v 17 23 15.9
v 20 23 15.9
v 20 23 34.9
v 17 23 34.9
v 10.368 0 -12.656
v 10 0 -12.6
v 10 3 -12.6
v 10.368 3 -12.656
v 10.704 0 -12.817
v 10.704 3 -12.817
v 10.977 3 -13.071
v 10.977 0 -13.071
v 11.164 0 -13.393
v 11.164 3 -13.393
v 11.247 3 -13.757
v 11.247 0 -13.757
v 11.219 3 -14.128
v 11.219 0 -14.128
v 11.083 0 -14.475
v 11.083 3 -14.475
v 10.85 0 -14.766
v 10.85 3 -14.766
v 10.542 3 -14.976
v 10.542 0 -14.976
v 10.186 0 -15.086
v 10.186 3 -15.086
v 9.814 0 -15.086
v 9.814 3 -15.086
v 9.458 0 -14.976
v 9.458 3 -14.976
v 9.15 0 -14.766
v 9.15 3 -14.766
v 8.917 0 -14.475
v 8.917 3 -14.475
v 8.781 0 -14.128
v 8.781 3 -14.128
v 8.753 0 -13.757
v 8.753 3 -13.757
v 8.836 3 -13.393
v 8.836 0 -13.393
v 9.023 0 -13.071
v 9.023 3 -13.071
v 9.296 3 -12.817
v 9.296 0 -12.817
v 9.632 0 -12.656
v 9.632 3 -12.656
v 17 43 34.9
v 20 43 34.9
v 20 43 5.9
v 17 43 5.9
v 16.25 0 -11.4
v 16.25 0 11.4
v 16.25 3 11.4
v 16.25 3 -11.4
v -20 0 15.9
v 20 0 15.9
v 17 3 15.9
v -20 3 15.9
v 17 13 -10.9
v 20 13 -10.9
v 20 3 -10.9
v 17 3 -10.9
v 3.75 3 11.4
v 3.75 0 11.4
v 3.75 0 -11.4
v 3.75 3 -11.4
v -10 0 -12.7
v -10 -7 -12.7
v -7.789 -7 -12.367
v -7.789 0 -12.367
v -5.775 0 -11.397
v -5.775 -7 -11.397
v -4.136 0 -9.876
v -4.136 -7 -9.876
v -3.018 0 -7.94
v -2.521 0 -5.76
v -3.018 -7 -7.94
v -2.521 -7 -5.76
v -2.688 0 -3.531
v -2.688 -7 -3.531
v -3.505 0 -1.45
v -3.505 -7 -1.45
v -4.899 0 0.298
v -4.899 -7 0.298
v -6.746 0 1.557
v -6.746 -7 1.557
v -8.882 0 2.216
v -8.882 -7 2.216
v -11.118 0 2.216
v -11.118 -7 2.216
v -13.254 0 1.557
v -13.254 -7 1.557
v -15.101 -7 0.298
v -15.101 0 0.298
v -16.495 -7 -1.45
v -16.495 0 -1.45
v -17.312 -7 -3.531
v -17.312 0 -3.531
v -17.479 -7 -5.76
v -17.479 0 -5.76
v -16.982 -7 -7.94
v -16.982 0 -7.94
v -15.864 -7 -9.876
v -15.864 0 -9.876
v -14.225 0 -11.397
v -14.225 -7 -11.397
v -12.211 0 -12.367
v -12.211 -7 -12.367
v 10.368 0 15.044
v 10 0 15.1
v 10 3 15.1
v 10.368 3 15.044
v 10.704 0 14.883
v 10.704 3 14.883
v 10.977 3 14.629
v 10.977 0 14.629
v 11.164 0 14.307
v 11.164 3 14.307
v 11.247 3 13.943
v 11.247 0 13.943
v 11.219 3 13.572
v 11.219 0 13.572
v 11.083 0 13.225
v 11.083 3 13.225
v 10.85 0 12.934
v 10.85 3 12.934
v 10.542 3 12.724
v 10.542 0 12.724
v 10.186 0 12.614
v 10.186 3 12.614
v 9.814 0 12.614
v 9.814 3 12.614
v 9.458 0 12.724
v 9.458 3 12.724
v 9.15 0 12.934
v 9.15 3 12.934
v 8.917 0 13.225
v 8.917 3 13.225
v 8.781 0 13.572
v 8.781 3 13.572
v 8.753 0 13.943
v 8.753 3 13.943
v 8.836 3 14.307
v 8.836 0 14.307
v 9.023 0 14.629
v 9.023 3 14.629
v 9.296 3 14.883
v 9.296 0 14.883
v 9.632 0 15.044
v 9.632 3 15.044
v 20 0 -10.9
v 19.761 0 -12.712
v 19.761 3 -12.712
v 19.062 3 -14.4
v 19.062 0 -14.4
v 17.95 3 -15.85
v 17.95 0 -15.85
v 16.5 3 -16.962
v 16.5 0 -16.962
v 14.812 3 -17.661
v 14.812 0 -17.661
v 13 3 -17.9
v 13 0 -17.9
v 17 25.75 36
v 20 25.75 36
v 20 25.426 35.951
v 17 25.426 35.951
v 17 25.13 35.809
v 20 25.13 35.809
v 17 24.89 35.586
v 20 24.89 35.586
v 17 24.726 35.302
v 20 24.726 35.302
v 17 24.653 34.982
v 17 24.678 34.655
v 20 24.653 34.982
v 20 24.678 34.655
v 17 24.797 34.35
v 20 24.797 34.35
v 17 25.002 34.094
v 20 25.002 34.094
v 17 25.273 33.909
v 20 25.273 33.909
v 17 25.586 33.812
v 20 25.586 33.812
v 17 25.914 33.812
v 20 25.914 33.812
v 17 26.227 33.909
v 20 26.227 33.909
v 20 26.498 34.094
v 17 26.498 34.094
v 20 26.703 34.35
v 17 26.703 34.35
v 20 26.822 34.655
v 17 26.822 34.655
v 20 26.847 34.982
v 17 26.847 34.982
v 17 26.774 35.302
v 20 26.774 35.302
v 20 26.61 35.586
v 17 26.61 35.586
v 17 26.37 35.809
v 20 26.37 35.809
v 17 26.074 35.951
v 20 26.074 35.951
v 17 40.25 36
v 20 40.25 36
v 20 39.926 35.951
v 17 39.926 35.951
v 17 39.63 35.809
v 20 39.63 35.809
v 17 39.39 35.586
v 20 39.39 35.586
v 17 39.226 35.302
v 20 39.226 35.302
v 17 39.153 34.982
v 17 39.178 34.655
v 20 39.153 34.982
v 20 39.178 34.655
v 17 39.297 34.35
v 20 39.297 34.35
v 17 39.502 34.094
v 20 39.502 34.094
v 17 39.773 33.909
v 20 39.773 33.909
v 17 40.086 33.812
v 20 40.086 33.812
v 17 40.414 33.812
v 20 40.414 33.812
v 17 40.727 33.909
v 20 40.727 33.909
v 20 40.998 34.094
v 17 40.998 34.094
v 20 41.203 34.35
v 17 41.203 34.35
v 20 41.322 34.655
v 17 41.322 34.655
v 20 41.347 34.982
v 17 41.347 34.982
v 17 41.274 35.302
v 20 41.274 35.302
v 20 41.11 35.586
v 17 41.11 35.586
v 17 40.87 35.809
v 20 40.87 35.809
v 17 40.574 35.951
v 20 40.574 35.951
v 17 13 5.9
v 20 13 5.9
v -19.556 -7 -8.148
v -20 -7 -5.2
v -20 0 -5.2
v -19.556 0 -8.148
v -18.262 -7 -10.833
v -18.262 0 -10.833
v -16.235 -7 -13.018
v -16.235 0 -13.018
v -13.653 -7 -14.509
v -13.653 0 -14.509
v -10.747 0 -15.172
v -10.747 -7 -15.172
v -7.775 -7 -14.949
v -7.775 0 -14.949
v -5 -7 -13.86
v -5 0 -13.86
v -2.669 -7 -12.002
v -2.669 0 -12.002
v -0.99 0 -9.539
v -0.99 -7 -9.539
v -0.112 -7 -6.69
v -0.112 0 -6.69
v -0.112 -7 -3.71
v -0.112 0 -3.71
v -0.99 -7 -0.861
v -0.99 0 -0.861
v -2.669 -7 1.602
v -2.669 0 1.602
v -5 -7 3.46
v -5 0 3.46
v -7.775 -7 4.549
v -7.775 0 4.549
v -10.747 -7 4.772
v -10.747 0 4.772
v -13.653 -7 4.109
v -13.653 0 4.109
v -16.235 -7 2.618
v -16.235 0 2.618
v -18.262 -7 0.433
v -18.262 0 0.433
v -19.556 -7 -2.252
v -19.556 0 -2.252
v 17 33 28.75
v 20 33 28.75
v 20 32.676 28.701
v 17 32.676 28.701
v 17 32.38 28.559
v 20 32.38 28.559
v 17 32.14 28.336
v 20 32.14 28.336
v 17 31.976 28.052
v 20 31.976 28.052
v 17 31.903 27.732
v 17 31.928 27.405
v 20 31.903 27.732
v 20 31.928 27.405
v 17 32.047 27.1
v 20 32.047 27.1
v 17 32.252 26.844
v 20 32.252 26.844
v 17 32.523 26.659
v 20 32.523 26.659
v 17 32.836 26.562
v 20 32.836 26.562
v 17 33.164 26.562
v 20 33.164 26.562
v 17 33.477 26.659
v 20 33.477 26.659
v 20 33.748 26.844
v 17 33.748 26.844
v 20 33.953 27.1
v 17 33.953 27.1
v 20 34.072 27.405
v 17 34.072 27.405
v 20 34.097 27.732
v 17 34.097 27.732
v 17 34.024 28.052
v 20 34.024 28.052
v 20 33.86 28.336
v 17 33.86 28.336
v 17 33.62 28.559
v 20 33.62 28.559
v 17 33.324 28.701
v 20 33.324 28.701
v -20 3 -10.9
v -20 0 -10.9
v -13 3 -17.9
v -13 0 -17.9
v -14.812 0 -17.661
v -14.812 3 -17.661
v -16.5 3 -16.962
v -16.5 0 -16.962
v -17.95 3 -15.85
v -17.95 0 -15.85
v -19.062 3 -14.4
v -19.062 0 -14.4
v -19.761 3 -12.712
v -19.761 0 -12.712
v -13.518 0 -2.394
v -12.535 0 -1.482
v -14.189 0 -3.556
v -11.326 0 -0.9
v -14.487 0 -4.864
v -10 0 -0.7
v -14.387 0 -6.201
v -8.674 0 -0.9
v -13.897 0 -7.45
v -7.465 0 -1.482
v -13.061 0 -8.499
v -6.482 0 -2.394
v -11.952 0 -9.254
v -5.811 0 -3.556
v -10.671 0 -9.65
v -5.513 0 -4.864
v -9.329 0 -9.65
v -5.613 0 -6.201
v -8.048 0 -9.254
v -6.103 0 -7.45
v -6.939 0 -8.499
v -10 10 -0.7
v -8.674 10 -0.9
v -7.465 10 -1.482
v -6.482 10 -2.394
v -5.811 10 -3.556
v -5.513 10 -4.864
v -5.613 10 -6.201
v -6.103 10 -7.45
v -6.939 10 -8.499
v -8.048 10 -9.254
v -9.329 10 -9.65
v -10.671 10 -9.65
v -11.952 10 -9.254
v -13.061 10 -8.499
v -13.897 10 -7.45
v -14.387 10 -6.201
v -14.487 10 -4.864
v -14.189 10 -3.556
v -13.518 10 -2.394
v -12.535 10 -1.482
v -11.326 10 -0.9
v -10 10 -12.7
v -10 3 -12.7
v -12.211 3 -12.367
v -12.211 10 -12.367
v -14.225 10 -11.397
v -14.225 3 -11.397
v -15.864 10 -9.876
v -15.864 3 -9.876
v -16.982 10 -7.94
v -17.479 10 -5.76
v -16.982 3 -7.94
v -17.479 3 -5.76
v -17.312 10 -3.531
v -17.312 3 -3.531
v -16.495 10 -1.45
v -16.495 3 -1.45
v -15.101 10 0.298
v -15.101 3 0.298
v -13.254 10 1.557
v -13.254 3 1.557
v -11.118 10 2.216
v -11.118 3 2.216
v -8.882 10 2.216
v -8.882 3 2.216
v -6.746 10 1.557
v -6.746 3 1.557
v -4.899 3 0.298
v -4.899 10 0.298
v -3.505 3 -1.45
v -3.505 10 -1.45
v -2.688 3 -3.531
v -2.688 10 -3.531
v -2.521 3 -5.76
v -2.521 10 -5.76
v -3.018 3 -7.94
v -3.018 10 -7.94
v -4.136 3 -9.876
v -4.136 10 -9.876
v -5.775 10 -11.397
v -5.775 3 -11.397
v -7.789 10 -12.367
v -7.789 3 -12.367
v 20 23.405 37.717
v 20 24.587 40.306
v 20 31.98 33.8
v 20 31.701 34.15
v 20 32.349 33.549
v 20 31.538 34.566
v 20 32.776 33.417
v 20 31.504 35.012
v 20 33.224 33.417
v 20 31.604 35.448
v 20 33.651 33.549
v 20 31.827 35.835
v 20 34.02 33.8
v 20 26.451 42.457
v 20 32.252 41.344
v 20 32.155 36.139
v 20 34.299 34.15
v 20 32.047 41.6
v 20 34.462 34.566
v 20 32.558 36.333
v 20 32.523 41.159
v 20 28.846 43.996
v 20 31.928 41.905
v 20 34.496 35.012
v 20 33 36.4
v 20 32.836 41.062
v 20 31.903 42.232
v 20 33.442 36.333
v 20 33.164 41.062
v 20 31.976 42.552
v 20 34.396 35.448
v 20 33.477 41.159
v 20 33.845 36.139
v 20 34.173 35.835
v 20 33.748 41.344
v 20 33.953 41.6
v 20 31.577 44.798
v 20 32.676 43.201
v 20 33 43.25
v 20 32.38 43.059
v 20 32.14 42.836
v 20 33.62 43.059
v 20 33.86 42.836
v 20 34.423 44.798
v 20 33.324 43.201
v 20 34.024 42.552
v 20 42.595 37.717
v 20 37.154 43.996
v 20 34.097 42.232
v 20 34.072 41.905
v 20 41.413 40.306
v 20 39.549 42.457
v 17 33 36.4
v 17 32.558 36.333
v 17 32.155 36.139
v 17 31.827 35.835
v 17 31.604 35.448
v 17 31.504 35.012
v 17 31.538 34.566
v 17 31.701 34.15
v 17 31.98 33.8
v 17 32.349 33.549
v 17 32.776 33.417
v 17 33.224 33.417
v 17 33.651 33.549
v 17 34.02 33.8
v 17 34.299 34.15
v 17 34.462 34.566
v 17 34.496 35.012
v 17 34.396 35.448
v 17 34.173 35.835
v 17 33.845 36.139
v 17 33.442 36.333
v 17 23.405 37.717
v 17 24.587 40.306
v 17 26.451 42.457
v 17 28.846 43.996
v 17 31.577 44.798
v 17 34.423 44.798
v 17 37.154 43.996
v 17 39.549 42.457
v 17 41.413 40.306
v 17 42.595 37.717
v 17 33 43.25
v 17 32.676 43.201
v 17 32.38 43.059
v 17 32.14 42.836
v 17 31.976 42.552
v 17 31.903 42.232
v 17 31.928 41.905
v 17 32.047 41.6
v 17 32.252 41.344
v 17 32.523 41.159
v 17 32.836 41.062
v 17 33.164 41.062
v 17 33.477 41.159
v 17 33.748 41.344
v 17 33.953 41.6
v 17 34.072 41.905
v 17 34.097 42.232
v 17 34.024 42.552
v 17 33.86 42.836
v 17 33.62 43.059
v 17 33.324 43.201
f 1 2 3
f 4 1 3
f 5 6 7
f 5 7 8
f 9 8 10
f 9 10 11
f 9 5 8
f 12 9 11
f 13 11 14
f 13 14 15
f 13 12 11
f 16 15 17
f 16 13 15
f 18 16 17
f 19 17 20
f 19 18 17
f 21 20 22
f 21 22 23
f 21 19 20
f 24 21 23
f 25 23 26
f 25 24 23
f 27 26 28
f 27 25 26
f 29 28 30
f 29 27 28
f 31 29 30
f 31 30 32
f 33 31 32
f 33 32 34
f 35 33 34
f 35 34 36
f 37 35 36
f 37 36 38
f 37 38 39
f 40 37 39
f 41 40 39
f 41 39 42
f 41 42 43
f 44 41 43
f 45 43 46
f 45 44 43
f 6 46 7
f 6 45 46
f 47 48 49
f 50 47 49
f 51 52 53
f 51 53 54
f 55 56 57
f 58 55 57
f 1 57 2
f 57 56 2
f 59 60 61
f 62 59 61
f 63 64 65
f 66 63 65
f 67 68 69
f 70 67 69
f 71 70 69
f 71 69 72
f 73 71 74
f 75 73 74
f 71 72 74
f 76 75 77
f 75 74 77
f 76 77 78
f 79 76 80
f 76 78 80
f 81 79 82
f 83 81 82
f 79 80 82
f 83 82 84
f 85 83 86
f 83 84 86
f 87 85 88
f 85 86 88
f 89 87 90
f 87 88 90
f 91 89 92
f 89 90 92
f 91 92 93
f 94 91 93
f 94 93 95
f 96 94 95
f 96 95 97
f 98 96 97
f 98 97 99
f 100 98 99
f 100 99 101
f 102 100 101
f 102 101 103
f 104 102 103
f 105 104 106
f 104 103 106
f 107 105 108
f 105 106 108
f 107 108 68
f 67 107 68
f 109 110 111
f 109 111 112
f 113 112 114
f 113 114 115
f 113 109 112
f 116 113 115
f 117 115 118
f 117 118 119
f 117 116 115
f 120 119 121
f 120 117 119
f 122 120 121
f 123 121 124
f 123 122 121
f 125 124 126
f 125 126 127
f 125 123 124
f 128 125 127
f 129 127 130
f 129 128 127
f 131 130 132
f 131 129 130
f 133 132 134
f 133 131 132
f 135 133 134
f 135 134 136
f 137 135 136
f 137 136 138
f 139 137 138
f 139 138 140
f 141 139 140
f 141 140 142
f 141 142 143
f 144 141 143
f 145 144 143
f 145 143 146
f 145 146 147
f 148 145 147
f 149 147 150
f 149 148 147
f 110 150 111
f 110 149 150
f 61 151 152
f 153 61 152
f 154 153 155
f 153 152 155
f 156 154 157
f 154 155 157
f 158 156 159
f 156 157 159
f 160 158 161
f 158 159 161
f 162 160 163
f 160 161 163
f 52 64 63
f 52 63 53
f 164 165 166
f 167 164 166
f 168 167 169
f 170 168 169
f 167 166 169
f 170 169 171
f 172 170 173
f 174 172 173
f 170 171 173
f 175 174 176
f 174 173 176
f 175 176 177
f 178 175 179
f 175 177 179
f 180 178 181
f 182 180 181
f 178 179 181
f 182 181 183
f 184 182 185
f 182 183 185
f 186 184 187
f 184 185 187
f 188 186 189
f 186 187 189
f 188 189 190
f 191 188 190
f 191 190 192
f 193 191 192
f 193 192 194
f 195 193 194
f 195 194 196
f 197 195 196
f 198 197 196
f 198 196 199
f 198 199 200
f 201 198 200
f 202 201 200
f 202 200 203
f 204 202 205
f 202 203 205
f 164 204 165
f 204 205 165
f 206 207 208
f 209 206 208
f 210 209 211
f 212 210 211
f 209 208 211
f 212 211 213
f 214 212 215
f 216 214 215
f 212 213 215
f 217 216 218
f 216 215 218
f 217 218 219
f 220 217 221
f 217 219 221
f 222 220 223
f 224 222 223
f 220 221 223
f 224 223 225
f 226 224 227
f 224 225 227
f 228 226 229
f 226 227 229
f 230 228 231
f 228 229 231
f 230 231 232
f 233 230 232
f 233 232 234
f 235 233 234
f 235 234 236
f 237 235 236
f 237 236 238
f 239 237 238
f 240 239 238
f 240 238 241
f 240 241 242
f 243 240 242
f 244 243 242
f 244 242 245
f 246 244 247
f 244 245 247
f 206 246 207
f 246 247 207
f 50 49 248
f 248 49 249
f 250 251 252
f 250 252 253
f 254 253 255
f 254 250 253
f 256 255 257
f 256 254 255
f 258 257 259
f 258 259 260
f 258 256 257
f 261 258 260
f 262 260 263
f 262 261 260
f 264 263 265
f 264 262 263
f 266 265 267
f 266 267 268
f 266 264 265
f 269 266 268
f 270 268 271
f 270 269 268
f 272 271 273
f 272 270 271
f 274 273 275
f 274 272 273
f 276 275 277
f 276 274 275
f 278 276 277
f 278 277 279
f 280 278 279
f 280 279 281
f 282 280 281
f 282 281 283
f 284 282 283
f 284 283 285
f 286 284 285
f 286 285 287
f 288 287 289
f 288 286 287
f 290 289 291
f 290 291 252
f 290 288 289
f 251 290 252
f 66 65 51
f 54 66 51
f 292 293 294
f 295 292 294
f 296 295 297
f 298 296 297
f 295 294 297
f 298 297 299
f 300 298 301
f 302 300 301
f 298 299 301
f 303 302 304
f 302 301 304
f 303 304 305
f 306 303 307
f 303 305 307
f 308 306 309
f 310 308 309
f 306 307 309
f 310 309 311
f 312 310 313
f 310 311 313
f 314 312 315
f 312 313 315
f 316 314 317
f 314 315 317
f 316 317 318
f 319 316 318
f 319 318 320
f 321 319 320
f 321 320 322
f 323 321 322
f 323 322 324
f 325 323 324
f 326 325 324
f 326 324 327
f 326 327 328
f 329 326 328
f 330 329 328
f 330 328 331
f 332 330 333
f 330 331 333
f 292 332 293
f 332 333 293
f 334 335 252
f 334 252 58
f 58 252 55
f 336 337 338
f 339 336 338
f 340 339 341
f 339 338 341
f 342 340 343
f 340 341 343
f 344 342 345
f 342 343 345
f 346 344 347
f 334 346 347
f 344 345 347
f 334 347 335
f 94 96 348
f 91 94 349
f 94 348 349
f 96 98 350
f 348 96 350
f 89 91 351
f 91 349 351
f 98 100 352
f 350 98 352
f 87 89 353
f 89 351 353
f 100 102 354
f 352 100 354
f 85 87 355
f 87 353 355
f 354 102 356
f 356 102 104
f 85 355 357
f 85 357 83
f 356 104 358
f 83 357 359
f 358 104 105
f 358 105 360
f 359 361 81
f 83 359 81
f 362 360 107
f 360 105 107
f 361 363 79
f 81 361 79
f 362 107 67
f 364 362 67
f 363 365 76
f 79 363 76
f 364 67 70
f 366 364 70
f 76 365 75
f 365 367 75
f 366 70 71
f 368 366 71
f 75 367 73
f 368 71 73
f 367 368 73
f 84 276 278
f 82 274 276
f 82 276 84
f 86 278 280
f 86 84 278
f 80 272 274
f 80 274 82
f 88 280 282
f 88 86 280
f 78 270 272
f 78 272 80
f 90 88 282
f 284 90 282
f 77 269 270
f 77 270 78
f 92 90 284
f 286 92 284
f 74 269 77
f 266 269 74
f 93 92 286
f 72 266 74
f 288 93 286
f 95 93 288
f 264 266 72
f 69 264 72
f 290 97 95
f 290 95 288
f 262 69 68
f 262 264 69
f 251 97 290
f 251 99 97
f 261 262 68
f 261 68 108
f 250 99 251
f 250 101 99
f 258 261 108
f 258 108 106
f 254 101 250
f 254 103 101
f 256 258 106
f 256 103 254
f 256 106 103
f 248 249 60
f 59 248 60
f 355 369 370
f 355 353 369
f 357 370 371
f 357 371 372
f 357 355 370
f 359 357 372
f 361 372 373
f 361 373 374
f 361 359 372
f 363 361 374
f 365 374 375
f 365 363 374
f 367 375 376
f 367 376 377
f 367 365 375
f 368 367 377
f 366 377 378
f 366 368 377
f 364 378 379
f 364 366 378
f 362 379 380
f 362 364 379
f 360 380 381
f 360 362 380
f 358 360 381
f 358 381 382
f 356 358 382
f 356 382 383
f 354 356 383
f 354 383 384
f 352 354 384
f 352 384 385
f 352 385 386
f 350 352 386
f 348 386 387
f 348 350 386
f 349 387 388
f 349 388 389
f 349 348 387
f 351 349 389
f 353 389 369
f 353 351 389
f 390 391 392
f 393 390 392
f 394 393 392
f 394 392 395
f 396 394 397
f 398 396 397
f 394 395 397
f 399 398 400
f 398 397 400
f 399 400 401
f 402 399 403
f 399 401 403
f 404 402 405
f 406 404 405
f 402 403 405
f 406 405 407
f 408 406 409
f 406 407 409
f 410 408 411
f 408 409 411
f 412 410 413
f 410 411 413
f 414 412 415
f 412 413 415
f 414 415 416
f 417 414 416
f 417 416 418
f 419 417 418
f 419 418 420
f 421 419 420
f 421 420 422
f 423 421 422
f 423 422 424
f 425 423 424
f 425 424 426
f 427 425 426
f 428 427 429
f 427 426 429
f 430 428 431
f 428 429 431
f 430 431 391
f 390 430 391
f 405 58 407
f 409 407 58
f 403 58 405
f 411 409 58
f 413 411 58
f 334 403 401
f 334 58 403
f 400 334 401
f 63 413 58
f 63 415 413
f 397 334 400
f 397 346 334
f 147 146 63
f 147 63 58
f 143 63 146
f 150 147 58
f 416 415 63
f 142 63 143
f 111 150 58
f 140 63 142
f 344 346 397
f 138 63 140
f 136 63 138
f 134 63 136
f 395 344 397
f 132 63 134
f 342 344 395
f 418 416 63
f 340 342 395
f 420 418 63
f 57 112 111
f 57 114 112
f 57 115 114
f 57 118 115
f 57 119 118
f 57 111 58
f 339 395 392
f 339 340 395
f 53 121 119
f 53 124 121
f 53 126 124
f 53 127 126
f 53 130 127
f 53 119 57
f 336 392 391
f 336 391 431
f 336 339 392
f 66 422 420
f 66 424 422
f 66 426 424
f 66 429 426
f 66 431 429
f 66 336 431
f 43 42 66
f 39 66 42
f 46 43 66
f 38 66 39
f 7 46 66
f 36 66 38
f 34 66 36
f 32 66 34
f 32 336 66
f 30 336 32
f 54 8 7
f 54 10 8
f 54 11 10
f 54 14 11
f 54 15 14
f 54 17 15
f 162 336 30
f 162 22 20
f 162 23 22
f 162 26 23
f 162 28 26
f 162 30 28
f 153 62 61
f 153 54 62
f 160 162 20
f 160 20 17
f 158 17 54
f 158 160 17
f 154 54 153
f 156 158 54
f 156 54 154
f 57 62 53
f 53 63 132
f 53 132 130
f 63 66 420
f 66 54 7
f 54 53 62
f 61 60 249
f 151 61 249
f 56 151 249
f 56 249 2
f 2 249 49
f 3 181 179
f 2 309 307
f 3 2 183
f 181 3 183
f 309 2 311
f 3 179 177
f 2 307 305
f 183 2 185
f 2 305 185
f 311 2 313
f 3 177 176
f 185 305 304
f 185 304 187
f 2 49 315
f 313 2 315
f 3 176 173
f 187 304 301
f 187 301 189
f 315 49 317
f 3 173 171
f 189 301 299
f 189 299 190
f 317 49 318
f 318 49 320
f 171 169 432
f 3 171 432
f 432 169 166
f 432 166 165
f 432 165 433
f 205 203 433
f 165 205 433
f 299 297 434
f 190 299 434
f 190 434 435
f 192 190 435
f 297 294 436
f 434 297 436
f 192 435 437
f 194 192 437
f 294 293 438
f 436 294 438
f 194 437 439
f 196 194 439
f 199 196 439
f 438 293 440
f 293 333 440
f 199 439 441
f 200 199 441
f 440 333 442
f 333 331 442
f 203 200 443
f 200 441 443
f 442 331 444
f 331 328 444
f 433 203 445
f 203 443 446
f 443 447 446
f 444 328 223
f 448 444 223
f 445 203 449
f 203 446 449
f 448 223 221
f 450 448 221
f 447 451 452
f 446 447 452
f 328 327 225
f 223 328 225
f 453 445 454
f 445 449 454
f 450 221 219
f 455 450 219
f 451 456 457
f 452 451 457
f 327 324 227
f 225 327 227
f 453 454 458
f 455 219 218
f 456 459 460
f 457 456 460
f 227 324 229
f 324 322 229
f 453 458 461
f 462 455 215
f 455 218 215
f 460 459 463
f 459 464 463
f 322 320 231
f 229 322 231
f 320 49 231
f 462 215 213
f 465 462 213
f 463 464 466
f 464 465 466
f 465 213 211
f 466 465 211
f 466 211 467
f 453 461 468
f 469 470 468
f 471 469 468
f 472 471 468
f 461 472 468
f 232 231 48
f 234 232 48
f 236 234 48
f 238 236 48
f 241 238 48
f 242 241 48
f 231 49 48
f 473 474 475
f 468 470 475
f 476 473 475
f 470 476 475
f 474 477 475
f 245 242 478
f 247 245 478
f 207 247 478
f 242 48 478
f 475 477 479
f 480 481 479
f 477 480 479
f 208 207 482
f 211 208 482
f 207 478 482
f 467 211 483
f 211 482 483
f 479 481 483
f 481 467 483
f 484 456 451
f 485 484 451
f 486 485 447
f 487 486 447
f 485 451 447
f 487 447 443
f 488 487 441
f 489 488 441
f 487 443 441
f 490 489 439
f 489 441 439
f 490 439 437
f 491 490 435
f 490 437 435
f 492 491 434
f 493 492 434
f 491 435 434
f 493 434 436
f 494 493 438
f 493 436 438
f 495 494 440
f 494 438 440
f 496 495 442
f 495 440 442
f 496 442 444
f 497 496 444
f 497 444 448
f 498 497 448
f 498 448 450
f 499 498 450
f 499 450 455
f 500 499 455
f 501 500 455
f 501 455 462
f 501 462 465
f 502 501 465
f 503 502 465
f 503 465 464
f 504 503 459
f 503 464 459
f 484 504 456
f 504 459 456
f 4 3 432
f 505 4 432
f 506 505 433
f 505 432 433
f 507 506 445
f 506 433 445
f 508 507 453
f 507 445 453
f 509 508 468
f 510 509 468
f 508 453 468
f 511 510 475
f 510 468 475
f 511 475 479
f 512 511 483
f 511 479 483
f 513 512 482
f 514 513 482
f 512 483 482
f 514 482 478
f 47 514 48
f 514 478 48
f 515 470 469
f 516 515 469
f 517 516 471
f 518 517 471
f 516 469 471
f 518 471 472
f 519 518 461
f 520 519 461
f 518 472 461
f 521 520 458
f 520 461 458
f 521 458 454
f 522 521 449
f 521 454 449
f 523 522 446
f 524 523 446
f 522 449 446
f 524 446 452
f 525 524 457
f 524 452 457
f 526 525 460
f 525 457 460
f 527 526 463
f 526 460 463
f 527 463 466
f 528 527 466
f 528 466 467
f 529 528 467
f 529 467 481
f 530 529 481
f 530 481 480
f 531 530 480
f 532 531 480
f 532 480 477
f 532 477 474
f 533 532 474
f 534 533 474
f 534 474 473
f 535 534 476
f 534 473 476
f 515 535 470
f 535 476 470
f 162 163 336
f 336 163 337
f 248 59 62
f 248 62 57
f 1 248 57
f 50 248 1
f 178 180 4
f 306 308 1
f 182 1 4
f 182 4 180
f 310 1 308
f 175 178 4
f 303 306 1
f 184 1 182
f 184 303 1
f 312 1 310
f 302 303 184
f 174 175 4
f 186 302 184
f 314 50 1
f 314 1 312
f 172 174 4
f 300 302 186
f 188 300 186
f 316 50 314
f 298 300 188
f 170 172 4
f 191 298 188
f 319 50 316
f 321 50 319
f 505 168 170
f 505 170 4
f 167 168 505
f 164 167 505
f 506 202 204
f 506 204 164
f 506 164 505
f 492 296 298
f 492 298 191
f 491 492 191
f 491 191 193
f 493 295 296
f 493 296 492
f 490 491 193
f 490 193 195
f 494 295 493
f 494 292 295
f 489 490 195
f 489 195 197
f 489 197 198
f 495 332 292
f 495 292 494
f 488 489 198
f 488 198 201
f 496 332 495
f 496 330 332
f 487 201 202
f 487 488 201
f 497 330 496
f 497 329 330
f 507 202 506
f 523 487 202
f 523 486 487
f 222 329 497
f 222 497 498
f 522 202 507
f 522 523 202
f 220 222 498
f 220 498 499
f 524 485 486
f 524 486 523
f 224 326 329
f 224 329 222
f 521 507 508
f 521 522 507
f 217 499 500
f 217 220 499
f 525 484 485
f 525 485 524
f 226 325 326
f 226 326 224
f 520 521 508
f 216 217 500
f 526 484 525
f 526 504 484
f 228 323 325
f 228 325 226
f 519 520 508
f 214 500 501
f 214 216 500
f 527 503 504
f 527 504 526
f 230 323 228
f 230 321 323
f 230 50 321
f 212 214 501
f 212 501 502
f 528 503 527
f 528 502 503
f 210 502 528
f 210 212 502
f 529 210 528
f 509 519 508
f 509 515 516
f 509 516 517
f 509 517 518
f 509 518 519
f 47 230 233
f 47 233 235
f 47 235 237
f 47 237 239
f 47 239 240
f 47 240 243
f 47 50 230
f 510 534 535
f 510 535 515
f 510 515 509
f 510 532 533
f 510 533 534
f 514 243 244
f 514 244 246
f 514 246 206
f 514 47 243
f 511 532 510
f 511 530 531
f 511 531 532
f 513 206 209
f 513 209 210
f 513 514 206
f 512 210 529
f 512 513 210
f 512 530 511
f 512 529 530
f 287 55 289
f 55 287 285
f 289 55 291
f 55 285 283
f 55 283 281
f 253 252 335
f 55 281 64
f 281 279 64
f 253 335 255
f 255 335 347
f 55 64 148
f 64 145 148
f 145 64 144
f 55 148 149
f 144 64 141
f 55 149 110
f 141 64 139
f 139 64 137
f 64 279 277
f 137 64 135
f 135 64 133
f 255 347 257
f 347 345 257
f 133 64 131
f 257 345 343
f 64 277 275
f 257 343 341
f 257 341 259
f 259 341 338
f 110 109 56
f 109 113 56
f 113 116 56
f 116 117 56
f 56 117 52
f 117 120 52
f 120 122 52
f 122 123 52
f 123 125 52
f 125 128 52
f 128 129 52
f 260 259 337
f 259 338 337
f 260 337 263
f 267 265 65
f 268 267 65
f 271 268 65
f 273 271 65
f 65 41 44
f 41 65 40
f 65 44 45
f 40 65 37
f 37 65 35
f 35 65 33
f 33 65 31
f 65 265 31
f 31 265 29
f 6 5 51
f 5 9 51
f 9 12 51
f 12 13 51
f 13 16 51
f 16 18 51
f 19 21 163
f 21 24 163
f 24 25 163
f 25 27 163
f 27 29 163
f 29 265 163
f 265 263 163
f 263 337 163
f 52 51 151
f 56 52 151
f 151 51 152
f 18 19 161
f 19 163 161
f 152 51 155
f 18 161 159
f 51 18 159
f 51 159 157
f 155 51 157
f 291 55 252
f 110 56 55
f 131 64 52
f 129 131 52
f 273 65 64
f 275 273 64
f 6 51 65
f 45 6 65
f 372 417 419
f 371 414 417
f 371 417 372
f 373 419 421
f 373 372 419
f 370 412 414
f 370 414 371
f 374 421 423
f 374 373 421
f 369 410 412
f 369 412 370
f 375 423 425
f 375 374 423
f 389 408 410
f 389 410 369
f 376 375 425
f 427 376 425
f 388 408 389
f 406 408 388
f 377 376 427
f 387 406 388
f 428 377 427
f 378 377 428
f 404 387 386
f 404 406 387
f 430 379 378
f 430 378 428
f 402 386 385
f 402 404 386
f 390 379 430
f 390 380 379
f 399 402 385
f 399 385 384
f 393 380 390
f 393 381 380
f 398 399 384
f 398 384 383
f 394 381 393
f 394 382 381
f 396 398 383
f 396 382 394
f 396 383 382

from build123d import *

# Parameters (mm, degrees)
SKETCH_1_R      = 4.5
SKETCH_1_R_2    = 1.25
SKETCH_1_W      = 12.5
SKETCH_1_H      = 22.8
EXTRUDE_1_DEPTH = 3
EXTRUDE_START   = 20
SKETCH_3_R      = 1.1
SKETCH_3_R_2    = 1.5
EXTRUDE_2_DEPTH = 3
SKETCH_4_R      = 7.5
SKETCH_4_R_2    = 4.5
EXTRUDE_3_DEPTH = 7
EXTRUDE_START_2 = 7
SKETCH_5_R      = 10
SKETCH_5_R_2    = 7.5
EXTRUDE_4_DEPTH = 7


with BuildPart() as part:
    # 草图1 → 凸台-拉伸1 (new body)
    with BuildSketch(Plane(origin=(0, 0, 0), x_dir=(1, 0, 0), z_dir=(0, 1, 0))):
        with BuildLine():
            Line((-20, -15.9), (20, -15.9))
            Line((20, -15.9), (20, 10.9))
            ThreePointArc((20, 10.9), (17.949747468, 15.849747468), (13, 17.9))
            Line((13, 17.9), (-13, 17.9))
            ThreePointArc((-13, 17.9), (-17.949747468, 15.849747468), (-20, 10.9))
            Line((-20, 10.9), (-20, -15.9))
        make_face()
        with Locations(Location((-10, 5.2, 0), (0, 0, 270))):
            Circle(SKETCH_1_R, mode=Mode.SUBTRACT)
        with Locations(Location((10, 13.85, 0), (0, 0, 270))):
            Circle(SKETCH_1_R_2, mode=Mode.SUBTRACT)
        with Locations(Location((10, -13.85, 0), (0, 0, 270))):
            Circle(SKETCH_1_R_2, mode=Mode.SUBTRACT)
        with Locations((10, 0)):
            Rectangle(SKETCH_1_W, SKETCH_1_H, mode=Mode.SUBTRACT)
    extrude(amount=EXTRUDE_1_DEPTH)

    # 草图3 → 凸台-拉伸2 (add)
    with BuildSketch(Plane(origin=(0, 0, 0), x_dir=(0, 0, -1), z_dir=(1, 0, 0)).offset(EXTRUDE_START)):
        with BuildLine():
            Line((-15.9, 3), (-15.9, 23))
            Line((-15.9, 23), (-34.9, 23))
            ThreePointArc((-34.9, 23), (-44.9, 33), (-34.9, 43))
            Line((-34.9, 43), (-5.9, 43))
            Line((-5.9, 43), (-5.9, 13))
            Line((-5.9, 13), (10.9, 13))
            Line((10.9, 13), (10.9, 3))
            Line((10.9, 3), (-15.9, 3))
        make_face()
        with Locations(Location((-42.15, 33, 0), (0, 0, 180))):
            Circle(SKETCH_3_R, mode=Mode.SUBTRACT)
        with Locations(Location((-34.9, 40.25, 0), (0, 0, 180))):
            Circle(SKETCH_3_R, mode=Mode.SUBTRACT)
        with Locations(Location((-27.65, 33, 0), (0, 0, 180))):
            Circle(SKETCH_3_R, mode=Mode.SUBTRACT)
        with Locations(Location((-34.9, 25.75, 0), (0, 0, 180))):
            Circle(SKETCH_3_R, mode=Mode.SUBTRACT)
        with Locations(Location((-34.9, 33, 0), (0, 0, 180))):
            Circle(SKETCH_3_R_2, mode=Mode.SUBTRACT)
    extrude(amount=-EXTRUDE_2_DEPTH)

    # 草图4 → 凸台-拉伸3 (add)
    with BuildSketch(Plane(origin=(0, 3, 0), x_dir=(1, 0, 0), z_dir=(0, 1, 0))):
        with Locations(Location((-10, 5.2, 0), (0, 0, 90))):
            Circle(SKETCH_4_R)
        with Locations(Location((-10, 5.2, 0), (0, 0, 270))):
            Circle(SKETCH_4_R_2, mode=Mode.SUBTRACT)
    extrude(amount=EXTRUDE_3_DEPTH)

    # 草图5 → 凸台-拉伸4 (add)
    with BuildSketch(Plane.XZ.offset(EXTRUDE_START_2)):
        with Locations(Location((-10, -5.2, 0), (0, 0, 180))):
            Circle(SKETCH_5_R)
        with Locations(Location((-10, -5.2, 0), (0, 0, 270))):
            Circle(SKETCH_5_R_2, mode=Mode.SUBTRACT)
    extrude(amount=-EXTRUDE_4_DEPTH)


solid = part.part
